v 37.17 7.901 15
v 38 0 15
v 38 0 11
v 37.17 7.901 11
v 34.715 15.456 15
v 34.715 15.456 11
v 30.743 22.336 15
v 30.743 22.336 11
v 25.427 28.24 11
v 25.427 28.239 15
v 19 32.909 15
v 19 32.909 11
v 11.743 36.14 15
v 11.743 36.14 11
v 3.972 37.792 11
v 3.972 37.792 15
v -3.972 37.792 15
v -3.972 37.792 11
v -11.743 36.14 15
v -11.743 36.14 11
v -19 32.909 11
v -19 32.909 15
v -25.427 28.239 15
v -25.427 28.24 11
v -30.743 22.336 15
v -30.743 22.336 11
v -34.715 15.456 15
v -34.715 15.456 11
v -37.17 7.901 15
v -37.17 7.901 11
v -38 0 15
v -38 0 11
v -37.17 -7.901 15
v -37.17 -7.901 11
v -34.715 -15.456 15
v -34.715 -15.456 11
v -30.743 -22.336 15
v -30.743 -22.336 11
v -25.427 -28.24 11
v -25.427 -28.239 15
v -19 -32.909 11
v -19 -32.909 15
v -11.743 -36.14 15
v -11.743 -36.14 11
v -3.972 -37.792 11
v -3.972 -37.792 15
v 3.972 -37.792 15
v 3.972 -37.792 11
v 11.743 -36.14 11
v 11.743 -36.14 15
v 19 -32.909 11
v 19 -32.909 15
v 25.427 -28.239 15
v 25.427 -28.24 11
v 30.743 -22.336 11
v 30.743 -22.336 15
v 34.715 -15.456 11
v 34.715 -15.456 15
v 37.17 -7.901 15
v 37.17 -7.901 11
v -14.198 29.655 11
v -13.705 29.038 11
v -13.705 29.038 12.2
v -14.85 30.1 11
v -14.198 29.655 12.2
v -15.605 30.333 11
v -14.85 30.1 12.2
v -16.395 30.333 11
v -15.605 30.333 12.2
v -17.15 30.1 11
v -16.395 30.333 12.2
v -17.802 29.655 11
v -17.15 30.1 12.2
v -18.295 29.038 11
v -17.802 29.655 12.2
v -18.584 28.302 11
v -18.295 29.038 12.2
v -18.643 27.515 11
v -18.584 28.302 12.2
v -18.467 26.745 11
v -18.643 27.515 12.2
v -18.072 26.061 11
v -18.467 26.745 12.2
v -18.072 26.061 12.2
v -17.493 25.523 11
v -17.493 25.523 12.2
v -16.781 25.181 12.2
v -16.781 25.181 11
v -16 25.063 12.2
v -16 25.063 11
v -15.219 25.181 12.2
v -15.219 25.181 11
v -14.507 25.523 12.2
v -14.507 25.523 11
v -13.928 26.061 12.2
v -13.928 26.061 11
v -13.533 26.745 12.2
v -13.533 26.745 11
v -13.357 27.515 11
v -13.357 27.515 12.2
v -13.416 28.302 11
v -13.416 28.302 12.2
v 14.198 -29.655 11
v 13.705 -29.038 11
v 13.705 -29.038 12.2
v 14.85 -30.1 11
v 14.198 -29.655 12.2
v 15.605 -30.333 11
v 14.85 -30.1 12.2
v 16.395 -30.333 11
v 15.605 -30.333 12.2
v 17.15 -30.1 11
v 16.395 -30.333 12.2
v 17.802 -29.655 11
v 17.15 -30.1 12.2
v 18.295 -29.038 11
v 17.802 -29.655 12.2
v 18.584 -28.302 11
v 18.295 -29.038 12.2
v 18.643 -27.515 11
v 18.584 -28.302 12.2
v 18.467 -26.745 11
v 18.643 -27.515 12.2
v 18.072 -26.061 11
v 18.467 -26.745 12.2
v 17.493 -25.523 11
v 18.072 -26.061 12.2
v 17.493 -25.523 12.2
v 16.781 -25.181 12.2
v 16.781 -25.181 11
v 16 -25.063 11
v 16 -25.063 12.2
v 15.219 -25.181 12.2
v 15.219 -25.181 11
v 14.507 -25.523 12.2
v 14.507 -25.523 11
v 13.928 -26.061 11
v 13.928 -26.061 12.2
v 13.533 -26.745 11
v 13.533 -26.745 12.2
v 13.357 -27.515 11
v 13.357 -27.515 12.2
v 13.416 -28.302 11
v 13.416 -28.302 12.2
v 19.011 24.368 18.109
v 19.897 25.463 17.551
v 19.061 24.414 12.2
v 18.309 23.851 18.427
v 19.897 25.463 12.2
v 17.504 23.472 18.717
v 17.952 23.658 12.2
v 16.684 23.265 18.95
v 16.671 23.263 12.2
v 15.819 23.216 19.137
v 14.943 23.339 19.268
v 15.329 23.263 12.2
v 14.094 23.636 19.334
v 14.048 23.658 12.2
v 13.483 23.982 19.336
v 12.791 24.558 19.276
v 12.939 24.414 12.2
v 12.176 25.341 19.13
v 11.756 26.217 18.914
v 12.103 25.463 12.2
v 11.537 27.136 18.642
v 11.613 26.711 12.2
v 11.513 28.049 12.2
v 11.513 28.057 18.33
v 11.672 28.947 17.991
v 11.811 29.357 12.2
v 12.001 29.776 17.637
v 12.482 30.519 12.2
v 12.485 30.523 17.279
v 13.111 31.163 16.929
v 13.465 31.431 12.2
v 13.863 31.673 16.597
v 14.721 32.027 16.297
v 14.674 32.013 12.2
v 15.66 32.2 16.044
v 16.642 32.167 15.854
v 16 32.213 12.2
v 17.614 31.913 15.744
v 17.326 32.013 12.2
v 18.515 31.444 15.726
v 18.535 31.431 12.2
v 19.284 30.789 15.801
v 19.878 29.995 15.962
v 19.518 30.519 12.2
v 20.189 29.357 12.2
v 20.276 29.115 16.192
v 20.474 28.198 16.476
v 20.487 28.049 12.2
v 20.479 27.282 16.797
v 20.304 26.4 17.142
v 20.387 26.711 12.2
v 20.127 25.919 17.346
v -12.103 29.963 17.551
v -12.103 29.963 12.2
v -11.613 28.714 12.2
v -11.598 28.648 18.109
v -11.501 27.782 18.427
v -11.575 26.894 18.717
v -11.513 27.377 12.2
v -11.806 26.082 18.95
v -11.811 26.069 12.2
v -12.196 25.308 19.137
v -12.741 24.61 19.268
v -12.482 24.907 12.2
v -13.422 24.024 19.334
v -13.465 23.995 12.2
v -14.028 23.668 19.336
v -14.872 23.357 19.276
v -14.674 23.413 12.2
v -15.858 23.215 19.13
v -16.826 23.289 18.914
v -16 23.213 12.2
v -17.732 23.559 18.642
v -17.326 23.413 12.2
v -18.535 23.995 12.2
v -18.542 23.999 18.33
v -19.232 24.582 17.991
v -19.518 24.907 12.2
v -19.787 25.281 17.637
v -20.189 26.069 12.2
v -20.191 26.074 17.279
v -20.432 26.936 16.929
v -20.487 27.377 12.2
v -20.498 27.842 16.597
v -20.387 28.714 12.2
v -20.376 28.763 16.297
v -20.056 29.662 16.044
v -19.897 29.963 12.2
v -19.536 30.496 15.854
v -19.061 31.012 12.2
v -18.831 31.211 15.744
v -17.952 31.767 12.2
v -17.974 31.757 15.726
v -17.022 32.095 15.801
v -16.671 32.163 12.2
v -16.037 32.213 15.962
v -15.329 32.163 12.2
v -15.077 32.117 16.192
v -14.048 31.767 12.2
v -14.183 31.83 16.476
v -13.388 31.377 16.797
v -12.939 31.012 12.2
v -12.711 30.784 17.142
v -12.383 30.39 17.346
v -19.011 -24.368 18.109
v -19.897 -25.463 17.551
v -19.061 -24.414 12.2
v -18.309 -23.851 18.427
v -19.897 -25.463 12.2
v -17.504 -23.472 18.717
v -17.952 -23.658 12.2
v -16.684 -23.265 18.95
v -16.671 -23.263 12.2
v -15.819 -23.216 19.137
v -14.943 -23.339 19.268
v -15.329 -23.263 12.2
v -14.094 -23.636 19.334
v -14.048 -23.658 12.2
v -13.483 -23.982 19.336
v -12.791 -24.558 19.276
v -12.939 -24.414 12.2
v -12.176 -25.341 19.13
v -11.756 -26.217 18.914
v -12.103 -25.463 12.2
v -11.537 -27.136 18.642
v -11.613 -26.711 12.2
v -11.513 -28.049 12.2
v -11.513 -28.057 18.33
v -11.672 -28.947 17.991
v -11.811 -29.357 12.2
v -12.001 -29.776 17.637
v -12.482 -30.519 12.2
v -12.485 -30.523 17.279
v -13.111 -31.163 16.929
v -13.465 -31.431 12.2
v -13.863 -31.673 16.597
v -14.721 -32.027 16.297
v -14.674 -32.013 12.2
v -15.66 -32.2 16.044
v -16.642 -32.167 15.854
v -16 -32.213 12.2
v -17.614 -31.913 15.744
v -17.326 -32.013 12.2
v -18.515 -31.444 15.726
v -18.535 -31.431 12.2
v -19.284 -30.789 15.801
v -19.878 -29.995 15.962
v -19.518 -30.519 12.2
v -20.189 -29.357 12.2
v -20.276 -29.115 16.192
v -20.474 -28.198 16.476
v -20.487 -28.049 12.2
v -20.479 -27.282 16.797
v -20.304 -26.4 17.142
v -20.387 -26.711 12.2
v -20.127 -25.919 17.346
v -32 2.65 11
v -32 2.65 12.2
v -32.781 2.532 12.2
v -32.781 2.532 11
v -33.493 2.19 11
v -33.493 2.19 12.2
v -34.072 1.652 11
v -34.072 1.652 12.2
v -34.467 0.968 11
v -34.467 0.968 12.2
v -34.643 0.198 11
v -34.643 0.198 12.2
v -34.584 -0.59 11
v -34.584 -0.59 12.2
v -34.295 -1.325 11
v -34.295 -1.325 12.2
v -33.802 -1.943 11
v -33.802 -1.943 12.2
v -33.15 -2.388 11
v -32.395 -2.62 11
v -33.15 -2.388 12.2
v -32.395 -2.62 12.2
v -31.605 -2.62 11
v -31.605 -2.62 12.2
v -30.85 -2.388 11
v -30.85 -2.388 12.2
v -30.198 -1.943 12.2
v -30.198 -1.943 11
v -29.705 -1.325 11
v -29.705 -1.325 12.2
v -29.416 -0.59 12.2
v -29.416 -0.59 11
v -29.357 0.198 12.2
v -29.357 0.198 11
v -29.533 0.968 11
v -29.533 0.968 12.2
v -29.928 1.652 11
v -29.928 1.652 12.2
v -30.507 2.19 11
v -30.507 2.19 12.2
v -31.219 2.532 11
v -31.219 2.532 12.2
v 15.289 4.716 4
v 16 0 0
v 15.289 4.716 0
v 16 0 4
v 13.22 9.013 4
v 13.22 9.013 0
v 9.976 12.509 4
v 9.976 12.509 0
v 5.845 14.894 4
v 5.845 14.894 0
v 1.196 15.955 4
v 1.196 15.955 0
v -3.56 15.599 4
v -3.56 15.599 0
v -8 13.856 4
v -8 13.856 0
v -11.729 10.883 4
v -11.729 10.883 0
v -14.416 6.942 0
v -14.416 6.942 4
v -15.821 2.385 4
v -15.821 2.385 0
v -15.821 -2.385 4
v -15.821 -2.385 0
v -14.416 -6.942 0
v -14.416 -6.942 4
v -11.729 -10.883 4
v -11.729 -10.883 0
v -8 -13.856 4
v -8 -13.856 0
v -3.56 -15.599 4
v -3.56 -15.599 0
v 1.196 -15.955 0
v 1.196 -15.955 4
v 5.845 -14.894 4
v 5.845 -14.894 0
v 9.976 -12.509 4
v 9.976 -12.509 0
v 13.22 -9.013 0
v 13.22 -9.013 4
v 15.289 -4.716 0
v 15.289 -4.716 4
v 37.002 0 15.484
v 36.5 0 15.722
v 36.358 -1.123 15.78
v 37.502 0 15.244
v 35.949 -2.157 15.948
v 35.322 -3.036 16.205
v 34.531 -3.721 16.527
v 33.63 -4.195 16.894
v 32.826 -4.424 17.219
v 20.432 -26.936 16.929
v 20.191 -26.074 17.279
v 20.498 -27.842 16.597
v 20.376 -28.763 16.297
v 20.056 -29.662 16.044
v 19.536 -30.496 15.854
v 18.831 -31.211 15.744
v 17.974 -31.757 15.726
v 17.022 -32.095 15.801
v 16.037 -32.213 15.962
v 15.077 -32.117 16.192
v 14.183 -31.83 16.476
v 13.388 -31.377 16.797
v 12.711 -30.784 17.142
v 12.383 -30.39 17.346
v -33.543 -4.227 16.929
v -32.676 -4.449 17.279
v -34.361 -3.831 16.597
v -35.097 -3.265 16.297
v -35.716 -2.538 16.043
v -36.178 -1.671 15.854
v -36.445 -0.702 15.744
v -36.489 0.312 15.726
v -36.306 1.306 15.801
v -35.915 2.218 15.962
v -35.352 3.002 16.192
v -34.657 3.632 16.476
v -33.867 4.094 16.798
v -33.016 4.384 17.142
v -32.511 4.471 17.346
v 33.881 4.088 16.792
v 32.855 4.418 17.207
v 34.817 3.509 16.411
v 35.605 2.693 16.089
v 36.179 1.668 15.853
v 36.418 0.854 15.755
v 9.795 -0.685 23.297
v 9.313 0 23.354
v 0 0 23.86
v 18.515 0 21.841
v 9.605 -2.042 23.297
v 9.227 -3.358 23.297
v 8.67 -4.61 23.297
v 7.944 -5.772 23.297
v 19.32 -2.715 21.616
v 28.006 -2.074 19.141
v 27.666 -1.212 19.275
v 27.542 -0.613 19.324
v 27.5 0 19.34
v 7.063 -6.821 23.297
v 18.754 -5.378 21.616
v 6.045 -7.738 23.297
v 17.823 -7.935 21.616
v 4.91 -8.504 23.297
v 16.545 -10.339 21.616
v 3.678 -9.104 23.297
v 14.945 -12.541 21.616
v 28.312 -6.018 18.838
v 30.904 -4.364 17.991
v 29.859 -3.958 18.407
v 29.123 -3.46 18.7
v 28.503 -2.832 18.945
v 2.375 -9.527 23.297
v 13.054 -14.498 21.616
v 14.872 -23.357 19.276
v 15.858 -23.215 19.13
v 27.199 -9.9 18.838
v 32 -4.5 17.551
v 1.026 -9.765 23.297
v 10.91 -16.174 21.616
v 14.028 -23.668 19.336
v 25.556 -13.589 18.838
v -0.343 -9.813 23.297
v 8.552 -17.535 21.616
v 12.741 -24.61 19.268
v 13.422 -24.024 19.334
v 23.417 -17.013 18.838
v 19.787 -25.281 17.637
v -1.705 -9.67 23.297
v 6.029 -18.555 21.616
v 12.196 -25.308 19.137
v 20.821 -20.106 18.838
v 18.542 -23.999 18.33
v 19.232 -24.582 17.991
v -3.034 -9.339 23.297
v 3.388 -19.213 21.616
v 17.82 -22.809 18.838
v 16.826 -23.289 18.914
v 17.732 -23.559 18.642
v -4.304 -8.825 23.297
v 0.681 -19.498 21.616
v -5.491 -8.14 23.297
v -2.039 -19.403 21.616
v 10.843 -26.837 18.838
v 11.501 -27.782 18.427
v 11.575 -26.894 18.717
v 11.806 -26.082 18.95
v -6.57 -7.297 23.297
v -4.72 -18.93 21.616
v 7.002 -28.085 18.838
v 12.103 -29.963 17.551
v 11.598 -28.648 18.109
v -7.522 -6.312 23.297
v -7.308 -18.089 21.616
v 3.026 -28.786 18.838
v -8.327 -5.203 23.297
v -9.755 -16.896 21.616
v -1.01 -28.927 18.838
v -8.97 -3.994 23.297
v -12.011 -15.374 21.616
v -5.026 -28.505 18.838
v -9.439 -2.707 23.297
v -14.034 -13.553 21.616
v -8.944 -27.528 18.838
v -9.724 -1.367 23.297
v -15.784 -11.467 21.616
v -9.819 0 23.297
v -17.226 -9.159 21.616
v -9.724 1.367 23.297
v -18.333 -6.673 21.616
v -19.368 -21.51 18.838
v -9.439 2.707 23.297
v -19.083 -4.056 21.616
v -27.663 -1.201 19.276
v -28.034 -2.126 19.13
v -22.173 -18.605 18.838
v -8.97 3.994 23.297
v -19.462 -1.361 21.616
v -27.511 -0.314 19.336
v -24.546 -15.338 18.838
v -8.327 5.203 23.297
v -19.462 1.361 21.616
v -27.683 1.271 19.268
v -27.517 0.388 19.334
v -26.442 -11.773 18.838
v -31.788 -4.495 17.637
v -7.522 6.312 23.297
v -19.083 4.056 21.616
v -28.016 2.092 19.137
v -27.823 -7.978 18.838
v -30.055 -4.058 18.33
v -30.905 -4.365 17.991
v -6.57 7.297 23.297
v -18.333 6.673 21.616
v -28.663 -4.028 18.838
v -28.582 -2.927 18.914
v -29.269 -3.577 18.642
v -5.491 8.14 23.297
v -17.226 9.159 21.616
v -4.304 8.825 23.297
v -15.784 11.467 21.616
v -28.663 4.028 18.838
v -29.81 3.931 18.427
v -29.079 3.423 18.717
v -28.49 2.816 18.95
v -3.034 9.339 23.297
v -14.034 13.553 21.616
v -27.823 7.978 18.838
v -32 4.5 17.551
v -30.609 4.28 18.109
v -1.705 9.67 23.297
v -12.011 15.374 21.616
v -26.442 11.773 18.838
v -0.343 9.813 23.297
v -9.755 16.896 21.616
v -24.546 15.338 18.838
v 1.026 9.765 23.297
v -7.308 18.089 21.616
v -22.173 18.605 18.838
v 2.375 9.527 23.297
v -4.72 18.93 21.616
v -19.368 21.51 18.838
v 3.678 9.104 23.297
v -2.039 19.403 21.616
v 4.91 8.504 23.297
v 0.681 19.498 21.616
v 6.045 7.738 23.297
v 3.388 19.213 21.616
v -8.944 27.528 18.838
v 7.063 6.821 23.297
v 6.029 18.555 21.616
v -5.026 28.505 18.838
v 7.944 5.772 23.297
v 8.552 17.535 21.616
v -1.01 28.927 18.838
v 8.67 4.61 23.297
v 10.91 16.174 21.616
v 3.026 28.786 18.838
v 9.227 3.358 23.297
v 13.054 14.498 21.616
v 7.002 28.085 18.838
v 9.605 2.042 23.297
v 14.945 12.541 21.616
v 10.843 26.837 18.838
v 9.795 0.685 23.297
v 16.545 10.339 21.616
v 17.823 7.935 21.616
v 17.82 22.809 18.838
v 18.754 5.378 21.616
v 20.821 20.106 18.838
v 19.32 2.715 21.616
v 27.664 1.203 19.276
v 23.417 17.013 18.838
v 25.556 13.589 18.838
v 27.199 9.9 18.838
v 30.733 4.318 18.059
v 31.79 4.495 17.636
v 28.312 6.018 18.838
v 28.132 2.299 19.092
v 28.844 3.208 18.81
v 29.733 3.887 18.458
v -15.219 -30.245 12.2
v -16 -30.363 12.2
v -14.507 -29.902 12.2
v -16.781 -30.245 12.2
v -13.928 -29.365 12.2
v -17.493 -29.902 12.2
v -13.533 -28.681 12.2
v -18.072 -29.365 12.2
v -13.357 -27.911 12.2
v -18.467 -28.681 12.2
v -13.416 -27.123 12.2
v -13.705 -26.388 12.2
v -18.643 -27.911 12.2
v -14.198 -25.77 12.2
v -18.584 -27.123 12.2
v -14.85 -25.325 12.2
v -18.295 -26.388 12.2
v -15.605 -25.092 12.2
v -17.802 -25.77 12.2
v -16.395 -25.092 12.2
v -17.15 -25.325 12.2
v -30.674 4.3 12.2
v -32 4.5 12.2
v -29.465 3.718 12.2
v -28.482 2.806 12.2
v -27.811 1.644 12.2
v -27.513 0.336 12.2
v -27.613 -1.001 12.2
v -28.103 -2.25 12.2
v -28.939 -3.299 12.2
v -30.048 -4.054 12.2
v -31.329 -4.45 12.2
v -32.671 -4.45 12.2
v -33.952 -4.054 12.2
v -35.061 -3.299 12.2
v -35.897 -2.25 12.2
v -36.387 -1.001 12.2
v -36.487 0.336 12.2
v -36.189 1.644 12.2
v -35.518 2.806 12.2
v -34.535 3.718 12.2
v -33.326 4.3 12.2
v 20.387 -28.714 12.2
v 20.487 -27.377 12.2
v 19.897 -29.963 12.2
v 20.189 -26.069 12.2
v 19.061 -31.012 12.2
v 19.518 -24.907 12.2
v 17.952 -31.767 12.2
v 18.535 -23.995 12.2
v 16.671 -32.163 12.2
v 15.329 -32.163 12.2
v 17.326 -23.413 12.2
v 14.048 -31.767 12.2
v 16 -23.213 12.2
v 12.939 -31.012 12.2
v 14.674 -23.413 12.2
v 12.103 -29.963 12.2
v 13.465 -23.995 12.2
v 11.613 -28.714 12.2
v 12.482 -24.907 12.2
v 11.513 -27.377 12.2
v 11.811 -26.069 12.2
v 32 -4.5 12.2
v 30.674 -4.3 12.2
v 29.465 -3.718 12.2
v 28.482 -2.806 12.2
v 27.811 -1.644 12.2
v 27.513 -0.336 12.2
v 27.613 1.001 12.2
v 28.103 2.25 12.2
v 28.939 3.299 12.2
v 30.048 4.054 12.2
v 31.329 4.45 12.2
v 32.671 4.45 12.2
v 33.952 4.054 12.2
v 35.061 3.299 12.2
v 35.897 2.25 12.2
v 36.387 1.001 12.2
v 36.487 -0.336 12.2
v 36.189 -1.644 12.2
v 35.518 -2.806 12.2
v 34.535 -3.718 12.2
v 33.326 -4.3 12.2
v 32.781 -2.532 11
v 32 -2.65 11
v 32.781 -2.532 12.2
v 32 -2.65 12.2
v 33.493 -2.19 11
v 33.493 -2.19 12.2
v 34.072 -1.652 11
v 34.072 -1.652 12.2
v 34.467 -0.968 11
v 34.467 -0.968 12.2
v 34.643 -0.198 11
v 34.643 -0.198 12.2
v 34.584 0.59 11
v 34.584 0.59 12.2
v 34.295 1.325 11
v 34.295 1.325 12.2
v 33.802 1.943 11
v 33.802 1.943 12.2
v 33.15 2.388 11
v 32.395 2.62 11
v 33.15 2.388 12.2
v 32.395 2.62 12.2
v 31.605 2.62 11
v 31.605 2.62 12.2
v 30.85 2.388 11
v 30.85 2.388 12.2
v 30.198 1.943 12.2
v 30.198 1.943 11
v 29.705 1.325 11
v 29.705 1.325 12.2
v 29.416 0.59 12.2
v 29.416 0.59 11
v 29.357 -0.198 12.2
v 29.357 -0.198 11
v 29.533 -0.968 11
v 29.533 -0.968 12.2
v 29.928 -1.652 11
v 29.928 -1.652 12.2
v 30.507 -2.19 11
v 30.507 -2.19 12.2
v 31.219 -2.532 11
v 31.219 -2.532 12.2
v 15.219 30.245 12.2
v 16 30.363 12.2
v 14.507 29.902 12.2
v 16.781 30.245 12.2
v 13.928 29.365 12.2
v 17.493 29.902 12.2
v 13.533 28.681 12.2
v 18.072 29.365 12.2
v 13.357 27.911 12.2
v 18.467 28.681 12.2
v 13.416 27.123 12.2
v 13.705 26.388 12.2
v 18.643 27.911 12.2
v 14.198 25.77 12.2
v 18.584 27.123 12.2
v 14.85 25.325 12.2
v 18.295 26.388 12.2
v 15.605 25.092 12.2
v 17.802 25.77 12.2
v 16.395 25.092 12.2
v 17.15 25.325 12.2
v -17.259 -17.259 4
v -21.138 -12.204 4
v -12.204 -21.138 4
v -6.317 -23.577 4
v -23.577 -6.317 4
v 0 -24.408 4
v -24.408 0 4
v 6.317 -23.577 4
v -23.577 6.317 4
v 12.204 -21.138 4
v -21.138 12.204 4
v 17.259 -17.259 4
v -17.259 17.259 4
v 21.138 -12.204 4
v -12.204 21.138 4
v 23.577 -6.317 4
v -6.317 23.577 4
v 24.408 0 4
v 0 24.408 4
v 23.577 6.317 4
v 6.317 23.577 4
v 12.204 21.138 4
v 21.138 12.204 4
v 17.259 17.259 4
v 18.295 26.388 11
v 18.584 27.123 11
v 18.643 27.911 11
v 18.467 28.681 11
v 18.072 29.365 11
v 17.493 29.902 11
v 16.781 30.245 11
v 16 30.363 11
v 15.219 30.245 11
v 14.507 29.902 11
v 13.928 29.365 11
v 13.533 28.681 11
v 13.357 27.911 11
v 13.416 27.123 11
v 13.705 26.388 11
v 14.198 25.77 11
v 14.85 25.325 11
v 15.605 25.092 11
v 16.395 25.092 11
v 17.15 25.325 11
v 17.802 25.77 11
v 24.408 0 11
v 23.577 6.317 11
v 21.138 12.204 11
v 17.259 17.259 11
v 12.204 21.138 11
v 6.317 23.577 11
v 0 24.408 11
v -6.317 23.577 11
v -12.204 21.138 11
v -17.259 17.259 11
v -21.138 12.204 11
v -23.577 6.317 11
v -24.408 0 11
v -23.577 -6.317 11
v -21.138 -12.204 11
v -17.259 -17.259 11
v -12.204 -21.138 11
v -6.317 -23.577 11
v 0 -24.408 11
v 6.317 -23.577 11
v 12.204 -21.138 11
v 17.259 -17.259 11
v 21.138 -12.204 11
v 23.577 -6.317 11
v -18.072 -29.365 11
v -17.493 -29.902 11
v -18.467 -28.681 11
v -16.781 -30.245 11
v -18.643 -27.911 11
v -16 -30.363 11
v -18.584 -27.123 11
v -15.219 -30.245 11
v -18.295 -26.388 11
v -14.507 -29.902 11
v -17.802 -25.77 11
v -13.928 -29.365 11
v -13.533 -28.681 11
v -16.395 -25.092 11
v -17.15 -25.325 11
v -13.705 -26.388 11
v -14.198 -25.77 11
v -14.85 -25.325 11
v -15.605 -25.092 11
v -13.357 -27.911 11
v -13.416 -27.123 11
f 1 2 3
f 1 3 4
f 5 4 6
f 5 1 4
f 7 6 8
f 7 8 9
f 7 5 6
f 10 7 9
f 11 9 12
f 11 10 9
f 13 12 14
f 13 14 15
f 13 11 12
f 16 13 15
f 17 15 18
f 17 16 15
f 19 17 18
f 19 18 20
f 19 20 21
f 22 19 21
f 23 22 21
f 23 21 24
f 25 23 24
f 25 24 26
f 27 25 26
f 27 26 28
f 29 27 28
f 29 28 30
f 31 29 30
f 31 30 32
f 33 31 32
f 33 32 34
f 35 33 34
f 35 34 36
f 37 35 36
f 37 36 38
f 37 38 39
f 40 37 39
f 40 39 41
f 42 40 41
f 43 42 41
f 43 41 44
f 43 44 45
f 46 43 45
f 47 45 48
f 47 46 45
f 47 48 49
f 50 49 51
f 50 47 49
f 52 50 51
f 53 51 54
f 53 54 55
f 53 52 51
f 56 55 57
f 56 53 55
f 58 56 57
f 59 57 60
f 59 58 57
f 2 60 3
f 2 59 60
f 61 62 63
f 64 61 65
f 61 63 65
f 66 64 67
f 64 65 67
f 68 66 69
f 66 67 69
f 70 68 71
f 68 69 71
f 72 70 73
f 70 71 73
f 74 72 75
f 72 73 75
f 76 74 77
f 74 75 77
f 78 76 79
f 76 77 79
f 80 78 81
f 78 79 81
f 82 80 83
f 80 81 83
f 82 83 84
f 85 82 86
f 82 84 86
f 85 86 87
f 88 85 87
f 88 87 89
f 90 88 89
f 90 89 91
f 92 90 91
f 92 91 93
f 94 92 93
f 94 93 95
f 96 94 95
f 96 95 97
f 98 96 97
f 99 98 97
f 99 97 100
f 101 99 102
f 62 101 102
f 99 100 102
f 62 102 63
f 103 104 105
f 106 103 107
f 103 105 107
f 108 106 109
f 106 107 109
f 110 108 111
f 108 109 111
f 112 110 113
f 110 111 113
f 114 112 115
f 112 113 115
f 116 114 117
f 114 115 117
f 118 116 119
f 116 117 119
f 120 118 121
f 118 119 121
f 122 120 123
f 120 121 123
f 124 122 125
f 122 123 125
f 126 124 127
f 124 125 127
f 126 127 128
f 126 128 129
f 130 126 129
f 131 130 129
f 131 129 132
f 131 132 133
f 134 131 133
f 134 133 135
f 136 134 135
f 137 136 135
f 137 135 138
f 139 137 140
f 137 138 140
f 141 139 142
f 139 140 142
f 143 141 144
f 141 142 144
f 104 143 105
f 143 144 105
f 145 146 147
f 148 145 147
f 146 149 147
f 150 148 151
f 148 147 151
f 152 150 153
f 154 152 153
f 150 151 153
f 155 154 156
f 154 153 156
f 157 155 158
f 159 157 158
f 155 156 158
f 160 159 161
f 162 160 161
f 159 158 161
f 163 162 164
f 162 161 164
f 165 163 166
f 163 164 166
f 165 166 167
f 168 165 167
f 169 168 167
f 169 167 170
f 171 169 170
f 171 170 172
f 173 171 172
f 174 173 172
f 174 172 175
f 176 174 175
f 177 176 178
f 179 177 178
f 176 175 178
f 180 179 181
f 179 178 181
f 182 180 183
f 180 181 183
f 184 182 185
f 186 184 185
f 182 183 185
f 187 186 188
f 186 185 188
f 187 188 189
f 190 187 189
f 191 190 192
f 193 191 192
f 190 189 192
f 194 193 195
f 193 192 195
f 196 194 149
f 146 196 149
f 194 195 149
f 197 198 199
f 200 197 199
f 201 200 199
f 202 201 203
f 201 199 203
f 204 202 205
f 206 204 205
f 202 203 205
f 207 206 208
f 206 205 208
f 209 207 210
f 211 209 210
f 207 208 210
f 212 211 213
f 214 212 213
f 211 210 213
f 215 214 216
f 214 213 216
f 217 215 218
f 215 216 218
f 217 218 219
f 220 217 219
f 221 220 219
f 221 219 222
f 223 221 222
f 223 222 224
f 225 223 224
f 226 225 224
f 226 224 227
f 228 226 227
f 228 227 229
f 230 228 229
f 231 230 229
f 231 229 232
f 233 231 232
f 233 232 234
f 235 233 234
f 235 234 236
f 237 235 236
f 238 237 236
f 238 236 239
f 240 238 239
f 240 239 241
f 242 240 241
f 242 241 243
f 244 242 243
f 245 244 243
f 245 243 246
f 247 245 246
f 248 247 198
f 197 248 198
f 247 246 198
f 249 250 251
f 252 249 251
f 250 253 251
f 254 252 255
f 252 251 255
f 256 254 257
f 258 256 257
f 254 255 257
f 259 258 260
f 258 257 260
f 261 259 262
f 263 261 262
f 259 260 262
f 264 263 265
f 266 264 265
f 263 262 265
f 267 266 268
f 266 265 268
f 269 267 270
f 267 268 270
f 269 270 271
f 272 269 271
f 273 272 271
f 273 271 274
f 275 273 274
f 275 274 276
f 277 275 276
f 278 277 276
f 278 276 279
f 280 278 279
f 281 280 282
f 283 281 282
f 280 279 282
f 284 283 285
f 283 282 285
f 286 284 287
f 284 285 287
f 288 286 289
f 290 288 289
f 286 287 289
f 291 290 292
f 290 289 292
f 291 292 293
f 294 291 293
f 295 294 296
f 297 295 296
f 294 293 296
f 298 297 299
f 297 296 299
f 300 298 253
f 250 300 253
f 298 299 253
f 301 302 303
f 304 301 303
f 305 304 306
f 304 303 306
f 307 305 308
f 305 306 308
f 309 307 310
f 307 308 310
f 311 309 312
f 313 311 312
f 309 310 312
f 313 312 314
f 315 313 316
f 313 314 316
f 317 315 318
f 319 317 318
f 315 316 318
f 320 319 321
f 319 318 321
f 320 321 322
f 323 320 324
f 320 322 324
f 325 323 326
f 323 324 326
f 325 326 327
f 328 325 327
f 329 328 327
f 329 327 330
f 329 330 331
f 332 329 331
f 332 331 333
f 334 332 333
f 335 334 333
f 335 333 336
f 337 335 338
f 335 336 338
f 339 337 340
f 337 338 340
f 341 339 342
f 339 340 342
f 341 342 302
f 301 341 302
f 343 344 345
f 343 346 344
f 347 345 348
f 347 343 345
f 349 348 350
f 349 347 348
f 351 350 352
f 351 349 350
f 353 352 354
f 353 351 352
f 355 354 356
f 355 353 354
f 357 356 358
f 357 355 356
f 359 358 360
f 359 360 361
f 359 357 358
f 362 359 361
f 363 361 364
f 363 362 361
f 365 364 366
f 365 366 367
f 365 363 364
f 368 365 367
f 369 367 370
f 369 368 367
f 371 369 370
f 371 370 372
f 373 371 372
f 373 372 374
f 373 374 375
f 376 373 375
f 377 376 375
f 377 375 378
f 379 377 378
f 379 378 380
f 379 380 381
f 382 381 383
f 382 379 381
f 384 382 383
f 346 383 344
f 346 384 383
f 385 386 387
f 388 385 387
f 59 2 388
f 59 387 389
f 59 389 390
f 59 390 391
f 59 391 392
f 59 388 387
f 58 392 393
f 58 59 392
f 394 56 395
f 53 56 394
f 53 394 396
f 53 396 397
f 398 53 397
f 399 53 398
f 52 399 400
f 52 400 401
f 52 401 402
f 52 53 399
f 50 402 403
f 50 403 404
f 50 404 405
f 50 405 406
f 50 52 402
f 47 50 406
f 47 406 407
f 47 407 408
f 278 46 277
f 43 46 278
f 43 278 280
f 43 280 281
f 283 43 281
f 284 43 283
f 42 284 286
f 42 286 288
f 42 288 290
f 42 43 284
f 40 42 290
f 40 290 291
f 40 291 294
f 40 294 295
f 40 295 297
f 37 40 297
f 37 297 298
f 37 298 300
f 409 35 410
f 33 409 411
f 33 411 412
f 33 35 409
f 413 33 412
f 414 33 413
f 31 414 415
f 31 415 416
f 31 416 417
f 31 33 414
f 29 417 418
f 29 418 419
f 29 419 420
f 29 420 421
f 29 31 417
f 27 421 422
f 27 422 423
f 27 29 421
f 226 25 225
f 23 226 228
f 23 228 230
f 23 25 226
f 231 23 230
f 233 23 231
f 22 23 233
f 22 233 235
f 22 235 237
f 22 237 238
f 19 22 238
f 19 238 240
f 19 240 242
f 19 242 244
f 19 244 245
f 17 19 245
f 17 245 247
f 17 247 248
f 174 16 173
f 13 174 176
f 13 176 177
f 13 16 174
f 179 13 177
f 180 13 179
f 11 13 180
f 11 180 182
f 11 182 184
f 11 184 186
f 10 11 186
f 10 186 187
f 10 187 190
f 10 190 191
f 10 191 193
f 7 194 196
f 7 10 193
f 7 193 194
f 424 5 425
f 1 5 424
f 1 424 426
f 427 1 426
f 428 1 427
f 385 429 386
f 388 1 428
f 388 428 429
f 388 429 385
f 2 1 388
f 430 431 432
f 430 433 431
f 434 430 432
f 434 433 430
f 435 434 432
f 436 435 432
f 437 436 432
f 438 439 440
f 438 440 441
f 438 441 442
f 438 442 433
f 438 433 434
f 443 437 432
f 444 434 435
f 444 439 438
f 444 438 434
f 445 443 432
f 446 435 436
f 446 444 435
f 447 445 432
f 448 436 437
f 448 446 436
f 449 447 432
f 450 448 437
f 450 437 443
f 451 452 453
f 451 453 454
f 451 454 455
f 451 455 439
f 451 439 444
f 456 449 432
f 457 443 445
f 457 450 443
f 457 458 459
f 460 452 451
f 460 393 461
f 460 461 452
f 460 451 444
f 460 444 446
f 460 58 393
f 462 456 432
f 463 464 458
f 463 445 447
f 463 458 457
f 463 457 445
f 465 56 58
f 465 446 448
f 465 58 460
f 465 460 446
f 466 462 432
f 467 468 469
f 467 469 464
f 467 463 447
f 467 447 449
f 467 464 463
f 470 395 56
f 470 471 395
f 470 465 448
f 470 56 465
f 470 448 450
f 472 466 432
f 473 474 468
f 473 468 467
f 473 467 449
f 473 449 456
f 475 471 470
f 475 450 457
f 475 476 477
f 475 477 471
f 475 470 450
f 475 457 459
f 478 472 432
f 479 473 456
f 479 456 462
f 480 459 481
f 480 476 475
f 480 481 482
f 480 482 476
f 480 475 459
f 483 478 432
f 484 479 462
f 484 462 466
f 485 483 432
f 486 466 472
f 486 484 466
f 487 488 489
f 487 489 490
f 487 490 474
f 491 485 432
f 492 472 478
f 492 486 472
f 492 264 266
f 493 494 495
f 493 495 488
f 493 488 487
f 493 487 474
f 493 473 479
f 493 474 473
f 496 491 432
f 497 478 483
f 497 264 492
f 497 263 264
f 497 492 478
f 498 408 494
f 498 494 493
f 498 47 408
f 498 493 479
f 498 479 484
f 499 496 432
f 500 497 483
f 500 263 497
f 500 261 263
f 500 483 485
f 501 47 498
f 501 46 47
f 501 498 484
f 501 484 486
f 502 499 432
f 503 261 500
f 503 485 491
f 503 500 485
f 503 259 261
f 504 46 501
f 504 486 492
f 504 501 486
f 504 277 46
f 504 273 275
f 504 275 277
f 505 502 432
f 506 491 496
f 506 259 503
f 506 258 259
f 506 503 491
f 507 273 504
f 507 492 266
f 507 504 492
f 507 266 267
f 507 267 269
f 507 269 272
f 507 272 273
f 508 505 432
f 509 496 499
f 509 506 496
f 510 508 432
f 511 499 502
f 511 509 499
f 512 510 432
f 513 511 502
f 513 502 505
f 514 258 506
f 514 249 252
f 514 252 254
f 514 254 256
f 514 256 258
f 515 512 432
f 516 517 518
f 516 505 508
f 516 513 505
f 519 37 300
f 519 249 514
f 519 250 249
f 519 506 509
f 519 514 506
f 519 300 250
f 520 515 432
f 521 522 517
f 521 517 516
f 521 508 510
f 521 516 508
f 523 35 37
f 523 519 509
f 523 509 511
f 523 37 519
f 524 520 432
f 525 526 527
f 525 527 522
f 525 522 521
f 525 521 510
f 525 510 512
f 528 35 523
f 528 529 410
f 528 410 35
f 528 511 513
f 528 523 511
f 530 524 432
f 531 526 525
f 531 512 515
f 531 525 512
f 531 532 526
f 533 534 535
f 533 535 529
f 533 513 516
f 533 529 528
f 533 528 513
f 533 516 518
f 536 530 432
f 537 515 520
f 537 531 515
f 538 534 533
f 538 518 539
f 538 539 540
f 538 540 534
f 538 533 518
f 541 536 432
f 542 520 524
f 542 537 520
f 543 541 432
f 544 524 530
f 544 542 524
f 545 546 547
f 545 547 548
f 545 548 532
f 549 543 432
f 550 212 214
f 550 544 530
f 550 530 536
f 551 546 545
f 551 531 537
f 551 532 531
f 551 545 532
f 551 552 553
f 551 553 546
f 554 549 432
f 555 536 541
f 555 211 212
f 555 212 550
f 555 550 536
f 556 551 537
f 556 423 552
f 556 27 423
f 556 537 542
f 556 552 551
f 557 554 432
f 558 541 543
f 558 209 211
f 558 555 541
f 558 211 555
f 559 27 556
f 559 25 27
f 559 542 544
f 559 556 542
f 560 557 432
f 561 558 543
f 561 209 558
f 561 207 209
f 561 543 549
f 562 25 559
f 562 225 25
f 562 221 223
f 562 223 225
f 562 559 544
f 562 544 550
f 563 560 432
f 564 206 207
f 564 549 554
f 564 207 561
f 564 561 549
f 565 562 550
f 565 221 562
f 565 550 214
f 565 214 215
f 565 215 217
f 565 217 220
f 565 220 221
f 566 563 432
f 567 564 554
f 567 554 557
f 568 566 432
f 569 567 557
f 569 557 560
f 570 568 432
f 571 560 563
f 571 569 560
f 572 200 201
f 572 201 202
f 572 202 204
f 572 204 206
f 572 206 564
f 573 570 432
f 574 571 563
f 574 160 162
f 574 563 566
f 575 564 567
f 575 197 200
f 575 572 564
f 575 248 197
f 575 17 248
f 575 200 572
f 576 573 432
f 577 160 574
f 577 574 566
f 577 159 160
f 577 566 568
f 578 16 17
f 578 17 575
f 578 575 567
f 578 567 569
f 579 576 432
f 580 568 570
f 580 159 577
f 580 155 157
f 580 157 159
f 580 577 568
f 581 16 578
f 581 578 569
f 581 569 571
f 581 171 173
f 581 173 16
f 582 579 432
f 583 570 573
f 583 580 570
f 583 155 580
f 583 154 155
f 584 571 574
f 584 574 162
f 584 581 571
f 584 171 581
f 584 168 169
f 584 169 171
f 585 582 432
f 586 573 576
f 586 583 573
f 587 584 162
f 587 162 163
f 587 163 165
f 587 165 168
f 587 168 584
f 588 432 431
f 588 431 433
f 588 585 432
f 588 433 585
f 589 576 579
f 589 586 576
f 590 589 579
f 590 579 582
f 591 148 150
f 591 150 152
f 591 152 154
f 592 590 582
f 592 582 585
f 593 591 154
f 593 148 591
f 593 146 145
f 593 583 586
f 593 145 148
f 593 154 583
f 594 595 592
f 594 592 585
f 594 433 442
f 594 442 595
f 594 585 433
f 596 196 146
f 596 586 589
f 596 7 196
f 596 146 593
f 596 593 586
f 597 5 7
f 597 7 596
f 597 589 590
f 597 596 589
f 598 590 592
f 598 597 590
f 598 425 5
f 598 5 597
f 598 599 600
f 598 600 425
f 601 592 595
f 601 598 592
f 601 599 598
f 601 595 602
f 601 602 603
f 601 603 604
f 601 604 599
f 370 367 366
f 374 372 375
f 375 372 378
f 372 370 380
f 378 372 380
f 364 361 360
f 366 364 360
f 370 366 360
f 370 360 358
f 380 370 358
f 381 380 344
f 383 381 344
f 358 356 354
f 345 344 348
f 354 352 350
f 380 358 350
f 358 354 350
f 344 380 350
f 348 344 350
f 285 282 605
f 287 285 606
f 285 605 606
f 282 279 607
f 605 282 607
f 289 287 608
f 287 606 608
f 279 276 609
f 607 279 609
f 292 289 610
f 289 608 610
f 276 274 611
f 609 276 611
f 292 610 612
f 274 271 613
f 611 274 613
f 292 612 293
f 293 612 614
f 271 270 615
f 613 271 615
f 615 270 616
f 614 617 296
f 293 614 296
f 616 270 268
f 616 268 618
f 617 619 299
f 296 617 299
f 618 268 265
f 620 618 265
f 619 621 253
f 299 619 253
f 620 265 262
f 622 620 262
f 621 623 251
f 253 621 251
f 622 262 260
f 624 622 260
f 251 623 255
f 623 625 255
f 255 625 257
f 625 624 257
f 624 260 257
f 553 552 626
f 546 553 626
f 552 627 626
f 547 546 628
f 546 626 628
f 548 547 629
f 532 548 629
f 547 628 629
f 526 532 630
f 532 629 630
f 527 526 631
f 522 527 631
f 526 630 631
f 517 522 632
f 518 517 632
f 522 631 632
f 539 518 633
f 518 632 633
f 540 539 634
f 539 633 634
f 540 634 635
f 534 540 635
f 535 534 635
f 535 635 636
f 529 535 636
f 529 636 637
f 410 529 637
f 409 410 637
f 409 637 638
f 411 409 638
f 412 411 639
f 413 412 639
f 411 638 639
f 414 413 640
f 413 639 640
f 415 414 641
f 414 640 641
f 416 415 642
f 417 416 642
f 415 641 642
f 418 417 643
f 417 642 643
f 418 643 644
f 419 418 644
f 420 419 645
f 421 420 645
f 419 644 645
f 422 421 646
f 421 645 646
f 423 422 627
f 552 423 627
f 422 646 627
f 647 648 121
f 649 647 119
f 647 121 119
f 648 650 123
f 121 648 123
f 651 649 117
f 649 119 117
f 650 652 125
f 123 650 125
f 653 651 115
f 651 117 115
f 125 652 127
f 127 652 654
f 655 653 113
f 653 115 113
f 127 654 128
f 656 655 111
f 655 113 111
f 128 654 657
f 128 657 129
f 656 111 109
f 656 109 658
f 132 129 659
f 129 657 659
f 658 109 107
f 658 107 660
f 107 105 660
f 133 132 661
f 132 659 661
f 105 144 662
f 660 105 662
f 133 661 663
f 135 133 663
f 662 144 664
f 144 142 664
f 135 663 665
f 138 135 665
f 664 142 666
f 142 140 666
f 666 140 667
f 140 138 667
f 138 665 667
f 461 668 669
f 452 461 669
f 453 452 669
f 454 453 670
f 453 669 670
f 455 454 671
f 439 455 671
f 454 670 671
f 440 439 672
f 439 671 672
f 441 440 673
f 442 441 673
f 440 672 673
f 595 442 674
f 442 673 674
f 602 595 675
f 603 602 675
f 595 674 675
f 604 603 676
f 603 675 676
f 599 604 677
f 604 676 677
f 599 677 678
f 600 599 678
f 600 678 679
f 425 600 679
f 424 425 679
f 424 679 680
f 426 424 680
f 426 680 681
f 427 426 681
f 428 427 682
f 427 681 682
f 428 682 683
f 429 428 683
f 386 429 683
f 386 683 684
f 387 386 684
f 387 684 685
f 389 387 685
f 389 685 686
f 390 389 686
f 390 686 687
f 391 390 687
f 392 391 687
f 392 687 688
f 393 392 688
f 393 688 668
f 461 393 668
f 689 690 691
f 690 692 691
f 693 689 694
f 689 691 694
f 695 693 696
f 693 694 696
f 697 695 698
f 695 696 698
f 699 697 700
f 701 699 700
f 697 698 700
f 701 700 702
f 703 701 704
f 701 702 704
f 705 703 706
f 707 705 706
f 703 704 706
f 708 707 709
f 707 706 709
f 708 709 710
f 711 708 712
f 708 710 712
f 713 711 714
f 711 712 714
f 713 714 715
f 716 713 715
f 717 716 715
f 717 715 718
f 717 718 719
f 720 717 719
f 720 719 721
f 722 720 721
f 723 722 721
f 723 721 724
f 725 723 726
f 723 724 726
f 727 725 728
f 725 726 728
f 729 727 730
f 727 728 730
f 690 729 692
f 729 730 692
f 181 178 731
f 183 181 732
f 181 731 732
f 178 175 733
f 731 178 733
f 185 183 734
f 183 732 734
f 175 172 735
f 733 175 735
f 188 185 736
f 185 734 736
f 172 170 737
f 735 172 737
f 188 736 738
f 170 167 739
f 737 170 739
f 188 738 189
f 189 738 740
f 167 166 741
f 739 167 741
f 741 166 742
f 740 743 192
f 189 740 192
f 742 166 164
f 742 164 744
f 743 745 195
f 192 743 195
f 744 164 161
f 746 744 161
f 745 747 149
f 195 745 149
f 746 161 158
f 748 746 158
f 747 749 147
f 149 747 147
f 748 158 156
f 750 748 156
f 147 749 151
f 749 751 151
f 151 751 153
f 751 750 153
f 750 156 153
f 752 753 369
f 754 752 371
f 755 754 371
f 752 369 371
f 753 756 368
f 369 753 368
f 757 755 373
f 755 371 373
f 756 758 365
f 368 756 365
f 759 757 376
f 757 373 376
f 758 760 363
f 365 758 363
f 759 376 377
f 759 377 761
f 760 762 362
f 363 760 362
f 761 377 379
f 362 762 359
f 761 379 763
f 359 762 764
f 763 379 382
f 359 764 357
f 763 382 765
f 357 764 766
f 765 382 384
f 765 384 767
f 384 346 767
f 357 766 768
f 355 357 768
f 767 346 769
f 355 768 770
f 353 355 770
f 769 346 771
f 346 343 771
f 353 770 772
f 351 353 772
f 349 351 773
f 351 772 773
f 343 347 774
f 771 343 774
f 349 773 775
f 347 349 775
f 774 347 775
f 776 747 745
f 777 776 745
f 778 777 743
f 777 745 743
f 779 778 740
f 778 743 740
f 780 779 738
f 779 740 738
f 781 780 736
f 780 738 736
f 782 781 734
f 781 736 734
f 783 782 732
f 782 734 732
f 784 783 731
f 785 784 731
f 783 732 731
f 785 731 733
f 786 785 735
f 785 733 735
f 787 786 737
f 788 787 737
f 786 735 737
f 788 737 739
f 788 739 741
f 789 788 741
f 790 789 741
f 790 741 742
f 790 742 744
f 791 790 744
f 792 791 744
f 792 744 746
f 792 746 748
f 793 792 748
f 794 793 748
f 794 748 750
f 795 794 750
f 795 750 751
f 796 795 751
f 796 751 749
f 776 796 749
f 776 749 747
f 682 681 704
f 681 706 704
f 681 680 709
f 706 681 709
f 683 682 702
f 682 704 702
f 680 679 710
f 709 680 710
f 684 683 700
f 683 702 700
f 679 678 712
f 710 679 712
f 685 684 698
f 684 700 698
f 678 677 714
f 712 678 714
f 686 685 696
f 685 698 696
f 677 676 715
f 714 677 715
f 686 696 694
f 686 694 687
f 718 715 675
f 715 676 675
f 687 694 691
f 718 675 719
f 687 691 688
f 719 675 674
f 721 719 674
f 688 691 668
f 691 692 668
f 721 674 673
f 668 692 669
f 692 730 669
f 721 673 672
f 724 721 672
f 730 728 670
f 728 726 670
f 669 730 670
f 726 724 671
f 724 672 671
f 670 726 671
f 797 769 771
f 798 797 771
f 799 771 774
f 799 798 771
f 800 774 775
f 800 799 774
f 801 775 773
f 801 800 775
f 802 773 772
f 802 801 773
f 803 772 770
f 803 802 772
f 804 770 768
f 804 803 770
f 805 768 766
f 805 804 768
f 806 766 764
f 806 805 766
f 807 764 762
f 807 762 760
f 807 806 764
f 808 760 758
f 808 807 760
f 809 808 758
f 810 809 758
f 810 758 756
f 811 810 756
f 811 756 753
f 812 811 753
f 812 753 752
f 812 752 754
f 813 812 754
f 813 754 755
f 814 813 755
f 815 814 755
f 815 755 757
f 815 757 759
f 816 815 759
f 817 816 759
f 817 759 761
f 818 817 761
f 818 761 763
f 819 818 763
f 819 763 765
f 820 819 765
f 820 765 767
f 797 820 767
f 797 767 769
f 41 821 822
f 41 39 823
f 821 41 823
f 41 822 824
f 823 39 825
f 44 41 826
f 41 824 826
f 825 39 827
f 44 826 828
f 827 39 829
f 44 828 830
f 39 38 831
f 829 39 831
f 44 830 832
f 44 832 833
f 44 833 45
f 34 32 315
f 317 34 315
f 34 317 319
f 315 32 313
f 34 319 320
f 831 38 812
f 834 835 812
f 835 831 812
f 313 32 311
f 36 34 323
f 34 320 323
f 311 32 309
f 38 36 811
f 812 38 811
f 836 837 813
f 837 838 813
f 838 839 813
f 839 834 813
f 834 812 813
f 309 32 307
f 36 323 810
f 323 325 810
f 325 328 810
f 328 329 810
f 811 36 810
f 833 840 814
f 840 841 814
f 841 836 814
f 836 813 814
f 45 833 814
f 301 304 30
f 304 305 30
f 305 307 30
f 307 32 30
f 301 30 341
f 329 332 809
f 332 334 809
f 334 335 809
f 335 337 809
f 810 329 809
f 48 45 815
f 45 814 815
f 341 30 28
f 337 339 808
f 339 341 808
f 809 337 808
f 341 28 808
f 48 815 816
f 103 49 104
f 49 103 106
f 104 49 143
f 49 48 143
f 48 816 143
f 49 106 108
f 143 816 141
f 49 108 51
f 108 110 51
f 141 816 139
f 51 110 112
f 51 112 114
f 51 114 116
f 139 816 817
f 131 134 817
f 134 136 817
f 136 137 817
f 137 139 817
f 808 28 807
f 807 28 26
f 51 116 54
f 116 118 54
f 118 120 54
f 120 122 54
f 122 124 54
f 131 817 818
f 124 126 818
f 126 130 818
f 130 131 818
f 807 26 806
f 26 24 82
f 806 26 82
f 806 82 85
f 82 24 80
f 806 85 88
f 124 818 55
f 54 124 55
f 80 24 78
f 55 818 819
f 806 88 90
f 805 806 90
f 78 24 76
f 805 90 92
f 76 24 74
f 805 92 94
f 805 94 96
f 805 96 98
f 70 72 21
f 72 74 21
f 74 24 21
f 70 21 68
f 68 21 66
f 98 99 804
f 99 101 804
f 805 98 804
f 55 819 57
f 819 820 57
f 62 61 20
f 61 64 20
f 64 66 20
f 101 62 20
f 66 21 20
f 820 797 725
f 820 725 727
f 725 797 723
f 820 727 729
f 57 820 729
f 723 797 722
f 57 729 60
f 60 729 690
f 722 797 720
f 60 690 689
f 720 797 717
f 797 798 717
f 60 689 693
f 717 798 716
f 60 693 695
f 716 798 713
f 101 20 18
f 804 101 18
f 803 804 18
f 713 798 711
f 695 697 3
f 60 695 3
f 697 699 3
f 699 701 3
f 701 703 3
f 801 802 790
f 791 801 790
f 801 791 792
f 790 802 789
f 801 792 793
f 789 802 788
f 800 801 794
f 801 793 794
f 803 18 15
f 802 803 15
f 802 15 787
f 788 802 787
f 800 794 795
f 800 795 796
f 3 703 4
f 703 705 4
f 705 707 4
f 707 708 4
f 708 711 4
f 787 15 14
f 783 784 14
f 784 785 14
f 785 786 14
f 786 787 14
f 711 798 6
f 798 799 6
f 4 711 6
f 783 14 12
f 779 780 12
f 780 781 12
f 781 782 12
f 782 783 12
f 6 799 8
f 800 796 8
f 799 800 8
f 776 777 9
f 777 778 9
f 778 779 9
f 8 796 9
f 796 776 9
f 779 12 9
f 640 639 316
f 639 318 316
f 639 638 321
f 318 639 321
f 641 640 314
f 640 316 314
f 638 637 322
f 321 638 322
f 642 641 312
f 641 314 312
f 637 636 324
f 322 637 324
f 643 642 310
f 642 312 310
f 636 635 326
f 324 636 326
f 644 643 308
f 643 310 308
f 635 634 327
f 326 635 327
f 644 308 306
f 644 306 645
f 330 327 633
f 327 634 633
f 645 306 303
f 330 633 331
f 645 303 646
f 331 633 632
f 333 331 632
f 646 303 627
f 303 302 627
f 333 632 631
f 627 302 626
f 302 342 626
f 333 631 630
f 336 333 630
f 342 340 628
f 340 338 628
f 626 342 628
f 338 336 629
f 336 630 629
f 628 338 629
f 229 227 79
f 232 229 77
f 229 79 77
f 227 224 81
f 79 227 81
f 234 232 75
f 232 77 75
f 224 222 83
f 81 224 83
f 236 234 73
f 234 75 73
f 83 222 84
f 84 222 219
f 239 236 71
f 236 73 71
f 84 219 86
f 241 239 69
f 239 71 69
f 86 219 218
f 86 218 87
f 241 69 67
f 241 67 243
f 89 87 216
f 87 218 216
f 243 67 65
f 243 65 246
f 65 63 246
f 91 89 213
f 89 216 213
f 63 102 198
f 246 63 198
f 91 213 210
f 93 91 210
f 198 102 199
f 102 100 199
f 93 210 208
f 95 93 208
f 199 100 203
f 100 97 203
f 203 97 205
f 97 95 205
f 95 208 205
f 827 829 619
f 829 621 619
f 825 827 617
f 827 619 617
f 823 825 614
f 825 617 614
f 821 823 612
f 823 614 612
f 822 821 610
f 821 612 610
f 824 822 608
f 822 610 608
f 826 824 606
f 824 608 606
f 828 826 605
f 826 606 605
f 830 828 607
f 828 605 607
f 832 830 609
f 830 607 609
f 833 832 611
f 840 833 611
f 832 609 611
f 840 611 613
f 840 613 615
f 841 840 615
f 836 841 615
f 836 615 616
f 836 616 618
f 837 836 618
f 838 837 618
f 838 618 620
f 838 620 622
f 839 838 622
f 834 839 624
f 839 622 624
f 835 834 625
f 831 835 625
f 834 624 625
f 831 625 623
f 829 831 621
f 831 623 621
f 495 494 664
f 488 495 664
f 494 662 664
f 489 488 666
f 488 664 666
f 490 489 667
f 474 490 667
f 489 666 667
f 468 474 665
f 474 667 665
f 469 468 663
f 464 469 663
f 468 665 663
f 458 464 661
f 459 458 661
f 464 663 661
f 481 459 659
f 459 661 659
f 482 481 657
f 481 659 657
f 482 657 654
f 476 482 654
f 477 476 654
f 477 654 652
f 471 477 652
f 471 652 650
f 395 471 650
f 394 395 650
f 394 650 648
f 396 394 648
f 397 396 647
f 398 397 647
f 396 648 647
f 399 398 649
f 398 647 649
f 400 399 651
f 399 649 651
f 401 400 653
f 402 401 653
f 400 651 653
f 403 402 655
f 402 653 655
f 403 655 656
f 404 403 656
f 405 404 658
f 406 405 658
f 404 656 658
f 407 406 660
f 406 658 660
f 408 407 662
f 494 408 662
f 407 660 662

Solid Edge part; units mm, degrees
sketch "Sketch1" plane through (0, 0, 0) normal (0, -1, 0) x (1, 0, 0)
  line L0 (0, 0) -> (16, 0)
  line L1 (16, 0) -> (16, 4)
  line L2 (16, 4) -> (24.4083, 4)
  line L3 (24.4083, 4) -> (24.4083, 11)
  line L4 (24.4083, 11) -> (38, 11)
  line L5 (38, 11) -> (38, 15)
  arc A0 (0, 23.8599) -> (38, 15) centre (0, -62.0605) cw
  dimension "D1" = 85.9204
  dimension "D2" = 4
  dimension "D3" = 7
  dimension "D4" = 15
revolve "RevolvedProtrusion1" add sketch "Sketch1" angle 360 about axis through (0, 0, 0) along (0, 0, 1)
hole "Hole_1" at (32, 0, 20) direction (0, 0, -1) diameter 5.3 end up to next counterbore diameter 9 counterbore depth 7.8
pattern_circular "Pattern1" count 6 over 360 about axis through (0, 0, 0) along (0, 0, -1) of "Hole_1"
properties material "Bronze, 90%"
